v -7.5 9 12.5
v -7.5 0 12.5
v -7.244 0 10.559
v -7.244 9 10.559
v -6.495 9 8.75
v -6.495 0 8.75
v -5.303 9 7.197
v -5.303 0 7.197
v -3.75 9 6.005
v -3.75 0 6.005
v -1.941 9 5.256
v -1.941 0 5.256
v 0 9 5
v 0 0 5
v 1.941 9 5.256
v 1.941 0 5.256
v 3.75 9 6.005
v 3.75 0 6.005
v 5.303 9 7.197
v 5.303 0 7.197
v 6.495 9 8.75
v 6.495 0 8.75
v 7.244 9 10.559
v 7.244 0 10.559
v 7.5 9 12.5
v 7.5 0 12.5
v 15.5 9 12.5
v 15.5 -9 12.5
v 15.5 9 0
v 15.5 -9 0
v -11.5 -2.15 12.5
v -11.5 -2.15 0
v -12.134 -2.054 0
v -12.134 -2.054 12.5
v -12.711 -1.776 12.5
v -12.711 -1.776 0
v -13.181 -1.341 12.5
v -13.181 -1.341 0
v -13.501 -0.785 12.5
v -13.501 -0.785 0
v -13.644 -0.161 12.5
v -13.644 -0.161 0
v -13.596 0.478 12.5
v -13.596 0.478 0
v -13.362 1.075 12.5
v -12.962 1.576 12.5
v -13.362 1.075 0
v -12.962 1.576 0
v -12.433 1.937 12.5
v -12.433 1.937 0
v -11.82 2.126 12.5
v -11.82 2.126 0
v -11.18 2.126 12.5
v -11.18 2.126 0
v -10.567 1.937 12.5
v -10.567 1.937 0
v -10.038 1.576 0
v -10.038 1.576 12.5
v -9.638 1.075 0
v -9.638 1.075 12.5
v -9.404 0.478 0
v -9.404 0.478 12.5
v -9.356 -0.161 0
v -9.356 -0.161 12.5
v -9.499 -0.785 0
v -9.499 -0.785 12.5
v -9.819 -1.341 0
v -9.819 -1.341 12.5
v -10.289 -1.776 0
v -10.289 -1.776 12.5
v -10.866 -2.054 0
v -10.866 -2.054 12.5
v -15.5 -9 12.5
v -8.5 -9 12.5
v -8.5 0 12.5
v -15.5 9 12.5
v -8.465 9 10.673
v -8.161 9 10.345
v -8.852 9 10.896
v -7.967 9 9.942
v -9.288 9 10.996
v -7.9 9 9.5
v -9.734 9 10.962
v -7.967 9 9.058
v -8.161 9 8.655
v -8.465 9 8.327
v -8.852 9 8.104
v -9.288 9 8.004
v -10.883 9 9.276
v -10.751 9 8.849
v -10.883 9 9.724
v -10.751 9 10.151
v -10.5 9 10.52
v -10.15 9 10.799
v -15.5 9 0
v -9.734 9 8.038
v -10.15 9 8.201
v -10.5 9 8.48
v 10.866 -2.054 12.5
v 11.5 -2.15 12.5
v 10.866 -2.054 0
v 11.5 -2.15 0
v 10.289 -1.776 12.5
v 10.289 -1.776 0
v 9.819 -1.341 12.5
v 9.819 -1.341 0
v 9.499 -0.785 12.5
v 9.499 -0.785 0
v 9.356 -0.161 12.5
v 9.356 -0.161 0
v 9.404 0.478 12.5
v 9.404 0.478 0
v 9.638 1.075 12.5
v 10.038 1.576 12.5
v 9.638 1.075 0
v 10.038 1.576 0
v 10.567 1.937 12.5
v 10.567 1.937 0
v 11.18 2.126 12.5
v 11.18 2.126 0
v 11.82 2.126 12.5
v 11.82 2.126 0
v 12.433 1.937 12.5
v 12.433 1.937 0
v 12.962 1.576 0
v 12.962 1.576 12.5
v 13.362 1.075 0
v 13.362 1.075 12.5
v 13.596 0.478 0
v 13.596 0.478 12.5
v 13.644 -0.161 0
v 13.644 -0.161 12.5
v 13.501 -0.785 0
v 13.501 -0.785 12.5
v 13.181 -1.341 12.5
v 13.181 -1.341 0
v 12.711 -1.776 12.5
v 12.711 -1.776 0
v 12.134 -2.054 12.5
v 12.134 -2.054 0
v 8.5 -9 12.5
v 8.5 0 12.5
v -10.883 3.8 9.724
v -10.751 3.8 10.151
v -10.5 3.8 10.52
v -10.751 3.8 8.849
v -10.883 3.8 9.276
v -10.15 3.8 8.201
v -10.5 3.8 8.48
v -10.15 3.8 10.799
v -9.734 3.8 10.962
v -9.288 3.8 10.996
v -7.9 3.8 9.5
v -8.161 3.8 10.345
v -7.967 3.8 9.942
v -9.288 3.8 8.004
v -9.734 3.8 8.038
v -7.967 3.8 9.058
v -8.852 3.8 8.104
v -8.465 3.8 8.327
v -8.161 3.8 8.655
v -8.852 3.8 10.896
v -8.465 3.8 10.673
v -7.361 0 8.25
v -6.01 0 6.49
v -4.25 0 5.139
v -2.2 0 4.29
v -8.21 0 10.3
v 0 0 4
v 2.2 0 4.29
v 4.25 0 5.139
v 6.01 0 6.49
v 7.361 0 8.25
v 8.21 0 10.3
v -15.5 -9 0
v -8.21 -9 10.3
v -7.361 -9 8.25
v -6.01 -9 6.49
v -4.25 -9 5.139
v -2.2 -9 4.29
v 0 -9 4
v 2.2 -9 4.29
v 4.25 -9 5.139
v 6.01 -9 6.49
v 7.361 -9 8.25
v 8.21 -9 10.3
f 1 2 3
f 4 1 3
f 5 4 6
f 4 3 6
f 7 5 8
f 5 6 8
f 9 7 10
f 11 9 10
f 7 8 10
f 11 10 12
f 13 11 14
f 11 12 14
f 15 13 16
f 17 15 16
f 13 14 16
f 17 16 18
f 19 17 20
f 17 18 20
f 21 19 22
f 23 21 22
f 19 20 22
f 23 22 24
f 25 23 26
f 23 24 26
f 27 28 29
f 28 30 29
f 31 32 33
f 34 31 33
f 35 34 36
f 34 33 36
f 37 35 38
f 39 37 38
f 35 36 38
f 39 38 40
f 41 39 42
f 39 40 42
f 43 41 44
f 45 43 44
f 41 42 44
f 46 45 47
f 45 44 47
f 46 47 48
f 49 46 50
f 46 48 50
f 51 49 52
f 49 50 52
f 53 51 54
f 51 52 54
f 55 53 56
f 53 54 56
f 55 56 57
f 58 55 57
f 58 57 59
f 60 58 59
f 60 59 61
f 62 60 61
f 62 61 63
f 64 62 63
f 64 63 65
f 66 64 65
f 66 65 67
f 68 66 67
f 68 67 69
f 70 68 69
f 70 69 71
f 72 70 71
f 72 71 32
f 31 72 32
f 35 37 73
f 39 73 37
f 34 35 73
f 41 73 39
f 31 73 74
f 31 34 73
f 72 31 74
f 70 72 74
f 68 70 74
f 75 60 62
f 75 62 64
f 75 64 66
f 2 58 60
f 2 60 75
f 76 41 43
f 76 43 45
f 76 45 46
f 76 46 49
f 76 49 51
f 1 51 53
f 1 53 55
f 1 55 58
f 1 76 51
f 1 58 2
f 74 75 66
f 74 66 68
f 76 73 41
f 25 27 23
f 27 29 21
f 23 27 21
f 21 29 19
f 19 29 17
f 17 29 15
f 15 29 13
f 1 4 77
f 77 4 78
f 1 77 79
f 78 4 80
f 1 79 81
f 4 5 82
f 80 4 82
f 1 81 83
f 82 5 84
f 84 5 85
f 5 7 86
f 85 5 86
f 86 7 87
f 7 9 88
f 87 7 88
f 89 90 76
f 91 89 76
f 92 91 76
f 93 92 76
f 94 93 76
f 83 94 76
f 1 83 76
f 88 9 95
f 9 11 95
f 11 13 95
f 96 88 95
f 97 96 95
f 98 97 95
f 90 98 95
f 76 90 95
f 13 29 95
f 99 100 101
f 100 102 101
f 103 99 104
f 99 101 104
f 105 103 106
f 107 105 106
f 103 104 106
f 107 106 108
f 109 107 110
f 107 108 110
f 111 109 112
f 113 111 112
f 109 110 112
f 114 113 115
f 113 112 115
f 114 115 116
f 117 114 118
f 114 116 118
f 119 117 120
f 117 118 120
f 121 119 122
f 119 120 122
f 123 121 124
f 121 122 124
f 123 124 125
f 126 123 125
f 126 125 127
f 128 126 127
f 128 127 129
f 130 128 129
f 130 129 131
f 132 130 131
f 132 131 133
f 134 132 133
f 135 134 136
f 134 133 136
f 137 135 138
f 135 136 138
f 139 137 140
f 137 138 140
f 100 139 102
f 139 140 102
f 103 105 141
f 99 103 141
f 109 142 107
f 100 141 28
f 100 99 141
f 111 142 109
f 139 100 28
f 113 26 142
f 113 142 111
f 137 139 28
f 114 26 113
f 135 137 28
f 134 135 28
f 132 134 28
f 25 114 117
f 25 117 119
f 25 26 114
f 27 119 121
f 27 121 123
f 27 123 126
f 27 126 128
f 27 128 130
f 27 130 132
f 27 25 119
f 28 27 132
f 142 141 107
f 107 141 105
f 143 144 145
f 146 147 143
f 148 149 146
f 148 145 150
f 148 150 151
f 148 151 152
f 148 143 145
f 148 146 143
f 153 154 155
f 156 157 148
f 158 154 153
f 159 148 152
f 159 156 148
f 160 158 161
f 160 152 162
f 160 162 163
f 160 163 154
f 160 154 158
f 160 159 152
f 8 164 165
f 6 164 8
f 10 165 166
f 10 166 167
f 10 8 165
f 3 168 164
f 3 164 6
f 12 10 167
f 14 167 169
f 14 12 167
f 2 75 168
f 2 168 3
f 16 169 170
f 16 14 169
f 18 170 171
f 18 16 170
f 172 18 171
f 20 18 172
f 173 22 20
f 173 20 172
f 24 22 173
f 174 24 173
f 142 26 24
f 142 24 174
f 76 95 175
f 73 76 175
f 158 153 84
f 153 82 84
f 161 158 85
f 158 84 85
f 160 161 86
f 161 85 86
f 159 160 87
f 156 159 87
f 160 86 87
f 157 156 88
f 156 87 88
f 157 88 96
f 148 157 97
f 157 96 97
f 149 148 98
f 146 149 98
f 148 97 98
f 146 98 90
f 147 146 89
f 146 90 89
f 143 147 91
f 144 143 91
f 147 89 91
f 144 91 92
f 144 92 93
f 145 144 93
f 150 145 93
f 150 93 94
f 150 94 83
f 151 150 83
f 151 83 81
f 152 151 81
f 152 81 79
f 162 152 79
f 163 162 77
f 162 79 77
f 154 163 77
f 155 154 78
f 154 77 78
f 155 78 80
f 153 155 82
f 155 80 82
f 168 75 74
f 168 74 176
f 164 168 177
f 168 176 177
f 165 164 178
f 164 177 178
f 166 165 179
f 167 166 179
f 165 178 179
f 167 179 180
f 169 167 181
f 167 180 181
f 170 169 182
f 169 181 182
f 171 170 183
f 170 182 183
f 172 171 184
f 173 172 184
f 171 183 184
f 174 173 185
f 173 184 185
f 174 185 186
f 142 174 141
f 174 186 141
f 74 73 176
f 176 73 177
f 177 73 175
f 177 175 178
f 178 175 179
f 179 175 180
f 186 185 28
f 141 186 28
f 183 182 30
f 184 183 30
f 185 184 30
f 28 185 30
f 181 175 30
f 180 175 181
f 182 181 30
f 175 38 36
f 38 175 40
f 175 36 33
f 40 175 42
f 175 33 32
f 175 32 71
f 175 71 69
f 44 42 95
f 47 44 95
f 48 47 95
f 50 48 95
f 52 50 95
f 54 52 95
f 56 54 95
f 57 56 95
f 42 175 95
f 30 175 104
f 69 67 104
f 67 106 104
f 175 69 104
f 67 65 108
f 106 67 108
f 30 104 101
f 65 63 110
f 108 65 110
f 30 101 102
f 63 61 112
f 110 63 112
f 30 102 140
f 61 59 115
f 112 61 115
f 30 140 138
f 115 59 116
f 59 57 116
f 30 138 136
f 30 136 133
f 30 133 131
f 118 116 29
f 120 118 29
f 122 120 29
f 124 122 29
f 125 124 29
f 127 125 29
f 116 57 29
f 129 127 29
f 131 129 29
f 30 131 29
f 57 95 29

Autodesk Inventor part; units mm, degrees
ref_plane "YZ Plane" through (0, 0, 0) normal (1, 0, 0) x (0, 1, 0)
ref_plane "XZ Plane" through (0, 0, 0) normal (0, 1, 0) x (-1, 0, 0)
ref_plane "XY Plane" through (0, 0, 0) normal (0, 0, 1) x (1, 0, 0)
sketch "Sketch1" plane through (0, 0, 0) normal (0, 0, 1) x (1, 0, 0)
  line L0 (-15.5, -9) -> (15.5, -9)
  line L1 (15.5, -9) -> (15.5, 9)
  line L2 (15.5, 9) -> (-15.5, 9)
  line L3 (-15.5, 9) -> (-15.5, -9)
  line L4 (-15.5, -9) -> (15.5, 9) construction
  line L5 (15.5, -9) -> (-15.5, 9) construction
  point P0 (0, 0)
  dimension "d0" = 31
  dimension "d1" = 18
extrude "Extrusion1" add sketch "Sketch1" along normal blind 12.5
sketch "Sketch4" plane through (-15.5, -9, 0) normal (0, -1, 0) x (1, 0, 0)
  line L0 (0, 12.5) -> (31, 12.5) projected
  circle A0 centre (15.5, 12.5) radius 7.5
  point P0 (15.5, 0)
  dimension "d24" = 15
extrude "Extrusion4" cut sketch "Sketch4" against normal through all
sketch "Sketch5" plane through (0, 0, 12.5) normal (0, 0, 1) x (1, 0, 0)
  line L0 (-15.5, -9) -> (-7.5, -9) projected
  line L1 (7.5, -9) -> (15.5, -9) projected
  point P0 (0, 0)
  point P1 (-11.5, 0)
  point P2 (11.5, 0)
  dimension "d86" = 11.5
  dimension "d87" = 11.5
  dimension "d88" = 9
  dimension "d89" = 9
sketch "Sketch8" plane through (-15.5, 9, 0) normal (0, 1, 0) x (1, 0, 0)
  circle A0 centre (6.1, -9.5) radius 1.5
  line L0 (8, -12.5) -> (0, -12.5) projected
  line L1 (0, 0) -> (0, -12.5) projected
  point P0 (15.5, 0)
  dimension "d57" = 3
  dimension "d59" = 3
  dimension "d61" = 6.1
hole "Hole1" at (-11.5, 0, 12.5) at (11.5, 0, 12.5) direction (0, 0, -1) diameter 4.3 end through all clearance for "Flat Head Machine Screw" size "M4" standard "Ansi Metric M Profile"
extrude "Extrusion11" cut sketch "Sketch8" against normal blind 5.2
sketch "Sketch13" plane through (-15.5, -9, 0) normal (0, -1, 0) x (1, 0, 0)
  arc A0 (8, 12.5) -> (23, 12.5) centre (15.5, 12.5) ccw projected
  circle A1 centre (15.5, 12.5) radius 8.5
  point P0 (15.5, 0)
  dimension "d99" = 17
extrude "Extrusion12" cut sketch "Sketch13" against normal blind 9
equation "\"d87\" = d86"
equation "\"d89\" = d88"
properties part number "Colimador inferior"
